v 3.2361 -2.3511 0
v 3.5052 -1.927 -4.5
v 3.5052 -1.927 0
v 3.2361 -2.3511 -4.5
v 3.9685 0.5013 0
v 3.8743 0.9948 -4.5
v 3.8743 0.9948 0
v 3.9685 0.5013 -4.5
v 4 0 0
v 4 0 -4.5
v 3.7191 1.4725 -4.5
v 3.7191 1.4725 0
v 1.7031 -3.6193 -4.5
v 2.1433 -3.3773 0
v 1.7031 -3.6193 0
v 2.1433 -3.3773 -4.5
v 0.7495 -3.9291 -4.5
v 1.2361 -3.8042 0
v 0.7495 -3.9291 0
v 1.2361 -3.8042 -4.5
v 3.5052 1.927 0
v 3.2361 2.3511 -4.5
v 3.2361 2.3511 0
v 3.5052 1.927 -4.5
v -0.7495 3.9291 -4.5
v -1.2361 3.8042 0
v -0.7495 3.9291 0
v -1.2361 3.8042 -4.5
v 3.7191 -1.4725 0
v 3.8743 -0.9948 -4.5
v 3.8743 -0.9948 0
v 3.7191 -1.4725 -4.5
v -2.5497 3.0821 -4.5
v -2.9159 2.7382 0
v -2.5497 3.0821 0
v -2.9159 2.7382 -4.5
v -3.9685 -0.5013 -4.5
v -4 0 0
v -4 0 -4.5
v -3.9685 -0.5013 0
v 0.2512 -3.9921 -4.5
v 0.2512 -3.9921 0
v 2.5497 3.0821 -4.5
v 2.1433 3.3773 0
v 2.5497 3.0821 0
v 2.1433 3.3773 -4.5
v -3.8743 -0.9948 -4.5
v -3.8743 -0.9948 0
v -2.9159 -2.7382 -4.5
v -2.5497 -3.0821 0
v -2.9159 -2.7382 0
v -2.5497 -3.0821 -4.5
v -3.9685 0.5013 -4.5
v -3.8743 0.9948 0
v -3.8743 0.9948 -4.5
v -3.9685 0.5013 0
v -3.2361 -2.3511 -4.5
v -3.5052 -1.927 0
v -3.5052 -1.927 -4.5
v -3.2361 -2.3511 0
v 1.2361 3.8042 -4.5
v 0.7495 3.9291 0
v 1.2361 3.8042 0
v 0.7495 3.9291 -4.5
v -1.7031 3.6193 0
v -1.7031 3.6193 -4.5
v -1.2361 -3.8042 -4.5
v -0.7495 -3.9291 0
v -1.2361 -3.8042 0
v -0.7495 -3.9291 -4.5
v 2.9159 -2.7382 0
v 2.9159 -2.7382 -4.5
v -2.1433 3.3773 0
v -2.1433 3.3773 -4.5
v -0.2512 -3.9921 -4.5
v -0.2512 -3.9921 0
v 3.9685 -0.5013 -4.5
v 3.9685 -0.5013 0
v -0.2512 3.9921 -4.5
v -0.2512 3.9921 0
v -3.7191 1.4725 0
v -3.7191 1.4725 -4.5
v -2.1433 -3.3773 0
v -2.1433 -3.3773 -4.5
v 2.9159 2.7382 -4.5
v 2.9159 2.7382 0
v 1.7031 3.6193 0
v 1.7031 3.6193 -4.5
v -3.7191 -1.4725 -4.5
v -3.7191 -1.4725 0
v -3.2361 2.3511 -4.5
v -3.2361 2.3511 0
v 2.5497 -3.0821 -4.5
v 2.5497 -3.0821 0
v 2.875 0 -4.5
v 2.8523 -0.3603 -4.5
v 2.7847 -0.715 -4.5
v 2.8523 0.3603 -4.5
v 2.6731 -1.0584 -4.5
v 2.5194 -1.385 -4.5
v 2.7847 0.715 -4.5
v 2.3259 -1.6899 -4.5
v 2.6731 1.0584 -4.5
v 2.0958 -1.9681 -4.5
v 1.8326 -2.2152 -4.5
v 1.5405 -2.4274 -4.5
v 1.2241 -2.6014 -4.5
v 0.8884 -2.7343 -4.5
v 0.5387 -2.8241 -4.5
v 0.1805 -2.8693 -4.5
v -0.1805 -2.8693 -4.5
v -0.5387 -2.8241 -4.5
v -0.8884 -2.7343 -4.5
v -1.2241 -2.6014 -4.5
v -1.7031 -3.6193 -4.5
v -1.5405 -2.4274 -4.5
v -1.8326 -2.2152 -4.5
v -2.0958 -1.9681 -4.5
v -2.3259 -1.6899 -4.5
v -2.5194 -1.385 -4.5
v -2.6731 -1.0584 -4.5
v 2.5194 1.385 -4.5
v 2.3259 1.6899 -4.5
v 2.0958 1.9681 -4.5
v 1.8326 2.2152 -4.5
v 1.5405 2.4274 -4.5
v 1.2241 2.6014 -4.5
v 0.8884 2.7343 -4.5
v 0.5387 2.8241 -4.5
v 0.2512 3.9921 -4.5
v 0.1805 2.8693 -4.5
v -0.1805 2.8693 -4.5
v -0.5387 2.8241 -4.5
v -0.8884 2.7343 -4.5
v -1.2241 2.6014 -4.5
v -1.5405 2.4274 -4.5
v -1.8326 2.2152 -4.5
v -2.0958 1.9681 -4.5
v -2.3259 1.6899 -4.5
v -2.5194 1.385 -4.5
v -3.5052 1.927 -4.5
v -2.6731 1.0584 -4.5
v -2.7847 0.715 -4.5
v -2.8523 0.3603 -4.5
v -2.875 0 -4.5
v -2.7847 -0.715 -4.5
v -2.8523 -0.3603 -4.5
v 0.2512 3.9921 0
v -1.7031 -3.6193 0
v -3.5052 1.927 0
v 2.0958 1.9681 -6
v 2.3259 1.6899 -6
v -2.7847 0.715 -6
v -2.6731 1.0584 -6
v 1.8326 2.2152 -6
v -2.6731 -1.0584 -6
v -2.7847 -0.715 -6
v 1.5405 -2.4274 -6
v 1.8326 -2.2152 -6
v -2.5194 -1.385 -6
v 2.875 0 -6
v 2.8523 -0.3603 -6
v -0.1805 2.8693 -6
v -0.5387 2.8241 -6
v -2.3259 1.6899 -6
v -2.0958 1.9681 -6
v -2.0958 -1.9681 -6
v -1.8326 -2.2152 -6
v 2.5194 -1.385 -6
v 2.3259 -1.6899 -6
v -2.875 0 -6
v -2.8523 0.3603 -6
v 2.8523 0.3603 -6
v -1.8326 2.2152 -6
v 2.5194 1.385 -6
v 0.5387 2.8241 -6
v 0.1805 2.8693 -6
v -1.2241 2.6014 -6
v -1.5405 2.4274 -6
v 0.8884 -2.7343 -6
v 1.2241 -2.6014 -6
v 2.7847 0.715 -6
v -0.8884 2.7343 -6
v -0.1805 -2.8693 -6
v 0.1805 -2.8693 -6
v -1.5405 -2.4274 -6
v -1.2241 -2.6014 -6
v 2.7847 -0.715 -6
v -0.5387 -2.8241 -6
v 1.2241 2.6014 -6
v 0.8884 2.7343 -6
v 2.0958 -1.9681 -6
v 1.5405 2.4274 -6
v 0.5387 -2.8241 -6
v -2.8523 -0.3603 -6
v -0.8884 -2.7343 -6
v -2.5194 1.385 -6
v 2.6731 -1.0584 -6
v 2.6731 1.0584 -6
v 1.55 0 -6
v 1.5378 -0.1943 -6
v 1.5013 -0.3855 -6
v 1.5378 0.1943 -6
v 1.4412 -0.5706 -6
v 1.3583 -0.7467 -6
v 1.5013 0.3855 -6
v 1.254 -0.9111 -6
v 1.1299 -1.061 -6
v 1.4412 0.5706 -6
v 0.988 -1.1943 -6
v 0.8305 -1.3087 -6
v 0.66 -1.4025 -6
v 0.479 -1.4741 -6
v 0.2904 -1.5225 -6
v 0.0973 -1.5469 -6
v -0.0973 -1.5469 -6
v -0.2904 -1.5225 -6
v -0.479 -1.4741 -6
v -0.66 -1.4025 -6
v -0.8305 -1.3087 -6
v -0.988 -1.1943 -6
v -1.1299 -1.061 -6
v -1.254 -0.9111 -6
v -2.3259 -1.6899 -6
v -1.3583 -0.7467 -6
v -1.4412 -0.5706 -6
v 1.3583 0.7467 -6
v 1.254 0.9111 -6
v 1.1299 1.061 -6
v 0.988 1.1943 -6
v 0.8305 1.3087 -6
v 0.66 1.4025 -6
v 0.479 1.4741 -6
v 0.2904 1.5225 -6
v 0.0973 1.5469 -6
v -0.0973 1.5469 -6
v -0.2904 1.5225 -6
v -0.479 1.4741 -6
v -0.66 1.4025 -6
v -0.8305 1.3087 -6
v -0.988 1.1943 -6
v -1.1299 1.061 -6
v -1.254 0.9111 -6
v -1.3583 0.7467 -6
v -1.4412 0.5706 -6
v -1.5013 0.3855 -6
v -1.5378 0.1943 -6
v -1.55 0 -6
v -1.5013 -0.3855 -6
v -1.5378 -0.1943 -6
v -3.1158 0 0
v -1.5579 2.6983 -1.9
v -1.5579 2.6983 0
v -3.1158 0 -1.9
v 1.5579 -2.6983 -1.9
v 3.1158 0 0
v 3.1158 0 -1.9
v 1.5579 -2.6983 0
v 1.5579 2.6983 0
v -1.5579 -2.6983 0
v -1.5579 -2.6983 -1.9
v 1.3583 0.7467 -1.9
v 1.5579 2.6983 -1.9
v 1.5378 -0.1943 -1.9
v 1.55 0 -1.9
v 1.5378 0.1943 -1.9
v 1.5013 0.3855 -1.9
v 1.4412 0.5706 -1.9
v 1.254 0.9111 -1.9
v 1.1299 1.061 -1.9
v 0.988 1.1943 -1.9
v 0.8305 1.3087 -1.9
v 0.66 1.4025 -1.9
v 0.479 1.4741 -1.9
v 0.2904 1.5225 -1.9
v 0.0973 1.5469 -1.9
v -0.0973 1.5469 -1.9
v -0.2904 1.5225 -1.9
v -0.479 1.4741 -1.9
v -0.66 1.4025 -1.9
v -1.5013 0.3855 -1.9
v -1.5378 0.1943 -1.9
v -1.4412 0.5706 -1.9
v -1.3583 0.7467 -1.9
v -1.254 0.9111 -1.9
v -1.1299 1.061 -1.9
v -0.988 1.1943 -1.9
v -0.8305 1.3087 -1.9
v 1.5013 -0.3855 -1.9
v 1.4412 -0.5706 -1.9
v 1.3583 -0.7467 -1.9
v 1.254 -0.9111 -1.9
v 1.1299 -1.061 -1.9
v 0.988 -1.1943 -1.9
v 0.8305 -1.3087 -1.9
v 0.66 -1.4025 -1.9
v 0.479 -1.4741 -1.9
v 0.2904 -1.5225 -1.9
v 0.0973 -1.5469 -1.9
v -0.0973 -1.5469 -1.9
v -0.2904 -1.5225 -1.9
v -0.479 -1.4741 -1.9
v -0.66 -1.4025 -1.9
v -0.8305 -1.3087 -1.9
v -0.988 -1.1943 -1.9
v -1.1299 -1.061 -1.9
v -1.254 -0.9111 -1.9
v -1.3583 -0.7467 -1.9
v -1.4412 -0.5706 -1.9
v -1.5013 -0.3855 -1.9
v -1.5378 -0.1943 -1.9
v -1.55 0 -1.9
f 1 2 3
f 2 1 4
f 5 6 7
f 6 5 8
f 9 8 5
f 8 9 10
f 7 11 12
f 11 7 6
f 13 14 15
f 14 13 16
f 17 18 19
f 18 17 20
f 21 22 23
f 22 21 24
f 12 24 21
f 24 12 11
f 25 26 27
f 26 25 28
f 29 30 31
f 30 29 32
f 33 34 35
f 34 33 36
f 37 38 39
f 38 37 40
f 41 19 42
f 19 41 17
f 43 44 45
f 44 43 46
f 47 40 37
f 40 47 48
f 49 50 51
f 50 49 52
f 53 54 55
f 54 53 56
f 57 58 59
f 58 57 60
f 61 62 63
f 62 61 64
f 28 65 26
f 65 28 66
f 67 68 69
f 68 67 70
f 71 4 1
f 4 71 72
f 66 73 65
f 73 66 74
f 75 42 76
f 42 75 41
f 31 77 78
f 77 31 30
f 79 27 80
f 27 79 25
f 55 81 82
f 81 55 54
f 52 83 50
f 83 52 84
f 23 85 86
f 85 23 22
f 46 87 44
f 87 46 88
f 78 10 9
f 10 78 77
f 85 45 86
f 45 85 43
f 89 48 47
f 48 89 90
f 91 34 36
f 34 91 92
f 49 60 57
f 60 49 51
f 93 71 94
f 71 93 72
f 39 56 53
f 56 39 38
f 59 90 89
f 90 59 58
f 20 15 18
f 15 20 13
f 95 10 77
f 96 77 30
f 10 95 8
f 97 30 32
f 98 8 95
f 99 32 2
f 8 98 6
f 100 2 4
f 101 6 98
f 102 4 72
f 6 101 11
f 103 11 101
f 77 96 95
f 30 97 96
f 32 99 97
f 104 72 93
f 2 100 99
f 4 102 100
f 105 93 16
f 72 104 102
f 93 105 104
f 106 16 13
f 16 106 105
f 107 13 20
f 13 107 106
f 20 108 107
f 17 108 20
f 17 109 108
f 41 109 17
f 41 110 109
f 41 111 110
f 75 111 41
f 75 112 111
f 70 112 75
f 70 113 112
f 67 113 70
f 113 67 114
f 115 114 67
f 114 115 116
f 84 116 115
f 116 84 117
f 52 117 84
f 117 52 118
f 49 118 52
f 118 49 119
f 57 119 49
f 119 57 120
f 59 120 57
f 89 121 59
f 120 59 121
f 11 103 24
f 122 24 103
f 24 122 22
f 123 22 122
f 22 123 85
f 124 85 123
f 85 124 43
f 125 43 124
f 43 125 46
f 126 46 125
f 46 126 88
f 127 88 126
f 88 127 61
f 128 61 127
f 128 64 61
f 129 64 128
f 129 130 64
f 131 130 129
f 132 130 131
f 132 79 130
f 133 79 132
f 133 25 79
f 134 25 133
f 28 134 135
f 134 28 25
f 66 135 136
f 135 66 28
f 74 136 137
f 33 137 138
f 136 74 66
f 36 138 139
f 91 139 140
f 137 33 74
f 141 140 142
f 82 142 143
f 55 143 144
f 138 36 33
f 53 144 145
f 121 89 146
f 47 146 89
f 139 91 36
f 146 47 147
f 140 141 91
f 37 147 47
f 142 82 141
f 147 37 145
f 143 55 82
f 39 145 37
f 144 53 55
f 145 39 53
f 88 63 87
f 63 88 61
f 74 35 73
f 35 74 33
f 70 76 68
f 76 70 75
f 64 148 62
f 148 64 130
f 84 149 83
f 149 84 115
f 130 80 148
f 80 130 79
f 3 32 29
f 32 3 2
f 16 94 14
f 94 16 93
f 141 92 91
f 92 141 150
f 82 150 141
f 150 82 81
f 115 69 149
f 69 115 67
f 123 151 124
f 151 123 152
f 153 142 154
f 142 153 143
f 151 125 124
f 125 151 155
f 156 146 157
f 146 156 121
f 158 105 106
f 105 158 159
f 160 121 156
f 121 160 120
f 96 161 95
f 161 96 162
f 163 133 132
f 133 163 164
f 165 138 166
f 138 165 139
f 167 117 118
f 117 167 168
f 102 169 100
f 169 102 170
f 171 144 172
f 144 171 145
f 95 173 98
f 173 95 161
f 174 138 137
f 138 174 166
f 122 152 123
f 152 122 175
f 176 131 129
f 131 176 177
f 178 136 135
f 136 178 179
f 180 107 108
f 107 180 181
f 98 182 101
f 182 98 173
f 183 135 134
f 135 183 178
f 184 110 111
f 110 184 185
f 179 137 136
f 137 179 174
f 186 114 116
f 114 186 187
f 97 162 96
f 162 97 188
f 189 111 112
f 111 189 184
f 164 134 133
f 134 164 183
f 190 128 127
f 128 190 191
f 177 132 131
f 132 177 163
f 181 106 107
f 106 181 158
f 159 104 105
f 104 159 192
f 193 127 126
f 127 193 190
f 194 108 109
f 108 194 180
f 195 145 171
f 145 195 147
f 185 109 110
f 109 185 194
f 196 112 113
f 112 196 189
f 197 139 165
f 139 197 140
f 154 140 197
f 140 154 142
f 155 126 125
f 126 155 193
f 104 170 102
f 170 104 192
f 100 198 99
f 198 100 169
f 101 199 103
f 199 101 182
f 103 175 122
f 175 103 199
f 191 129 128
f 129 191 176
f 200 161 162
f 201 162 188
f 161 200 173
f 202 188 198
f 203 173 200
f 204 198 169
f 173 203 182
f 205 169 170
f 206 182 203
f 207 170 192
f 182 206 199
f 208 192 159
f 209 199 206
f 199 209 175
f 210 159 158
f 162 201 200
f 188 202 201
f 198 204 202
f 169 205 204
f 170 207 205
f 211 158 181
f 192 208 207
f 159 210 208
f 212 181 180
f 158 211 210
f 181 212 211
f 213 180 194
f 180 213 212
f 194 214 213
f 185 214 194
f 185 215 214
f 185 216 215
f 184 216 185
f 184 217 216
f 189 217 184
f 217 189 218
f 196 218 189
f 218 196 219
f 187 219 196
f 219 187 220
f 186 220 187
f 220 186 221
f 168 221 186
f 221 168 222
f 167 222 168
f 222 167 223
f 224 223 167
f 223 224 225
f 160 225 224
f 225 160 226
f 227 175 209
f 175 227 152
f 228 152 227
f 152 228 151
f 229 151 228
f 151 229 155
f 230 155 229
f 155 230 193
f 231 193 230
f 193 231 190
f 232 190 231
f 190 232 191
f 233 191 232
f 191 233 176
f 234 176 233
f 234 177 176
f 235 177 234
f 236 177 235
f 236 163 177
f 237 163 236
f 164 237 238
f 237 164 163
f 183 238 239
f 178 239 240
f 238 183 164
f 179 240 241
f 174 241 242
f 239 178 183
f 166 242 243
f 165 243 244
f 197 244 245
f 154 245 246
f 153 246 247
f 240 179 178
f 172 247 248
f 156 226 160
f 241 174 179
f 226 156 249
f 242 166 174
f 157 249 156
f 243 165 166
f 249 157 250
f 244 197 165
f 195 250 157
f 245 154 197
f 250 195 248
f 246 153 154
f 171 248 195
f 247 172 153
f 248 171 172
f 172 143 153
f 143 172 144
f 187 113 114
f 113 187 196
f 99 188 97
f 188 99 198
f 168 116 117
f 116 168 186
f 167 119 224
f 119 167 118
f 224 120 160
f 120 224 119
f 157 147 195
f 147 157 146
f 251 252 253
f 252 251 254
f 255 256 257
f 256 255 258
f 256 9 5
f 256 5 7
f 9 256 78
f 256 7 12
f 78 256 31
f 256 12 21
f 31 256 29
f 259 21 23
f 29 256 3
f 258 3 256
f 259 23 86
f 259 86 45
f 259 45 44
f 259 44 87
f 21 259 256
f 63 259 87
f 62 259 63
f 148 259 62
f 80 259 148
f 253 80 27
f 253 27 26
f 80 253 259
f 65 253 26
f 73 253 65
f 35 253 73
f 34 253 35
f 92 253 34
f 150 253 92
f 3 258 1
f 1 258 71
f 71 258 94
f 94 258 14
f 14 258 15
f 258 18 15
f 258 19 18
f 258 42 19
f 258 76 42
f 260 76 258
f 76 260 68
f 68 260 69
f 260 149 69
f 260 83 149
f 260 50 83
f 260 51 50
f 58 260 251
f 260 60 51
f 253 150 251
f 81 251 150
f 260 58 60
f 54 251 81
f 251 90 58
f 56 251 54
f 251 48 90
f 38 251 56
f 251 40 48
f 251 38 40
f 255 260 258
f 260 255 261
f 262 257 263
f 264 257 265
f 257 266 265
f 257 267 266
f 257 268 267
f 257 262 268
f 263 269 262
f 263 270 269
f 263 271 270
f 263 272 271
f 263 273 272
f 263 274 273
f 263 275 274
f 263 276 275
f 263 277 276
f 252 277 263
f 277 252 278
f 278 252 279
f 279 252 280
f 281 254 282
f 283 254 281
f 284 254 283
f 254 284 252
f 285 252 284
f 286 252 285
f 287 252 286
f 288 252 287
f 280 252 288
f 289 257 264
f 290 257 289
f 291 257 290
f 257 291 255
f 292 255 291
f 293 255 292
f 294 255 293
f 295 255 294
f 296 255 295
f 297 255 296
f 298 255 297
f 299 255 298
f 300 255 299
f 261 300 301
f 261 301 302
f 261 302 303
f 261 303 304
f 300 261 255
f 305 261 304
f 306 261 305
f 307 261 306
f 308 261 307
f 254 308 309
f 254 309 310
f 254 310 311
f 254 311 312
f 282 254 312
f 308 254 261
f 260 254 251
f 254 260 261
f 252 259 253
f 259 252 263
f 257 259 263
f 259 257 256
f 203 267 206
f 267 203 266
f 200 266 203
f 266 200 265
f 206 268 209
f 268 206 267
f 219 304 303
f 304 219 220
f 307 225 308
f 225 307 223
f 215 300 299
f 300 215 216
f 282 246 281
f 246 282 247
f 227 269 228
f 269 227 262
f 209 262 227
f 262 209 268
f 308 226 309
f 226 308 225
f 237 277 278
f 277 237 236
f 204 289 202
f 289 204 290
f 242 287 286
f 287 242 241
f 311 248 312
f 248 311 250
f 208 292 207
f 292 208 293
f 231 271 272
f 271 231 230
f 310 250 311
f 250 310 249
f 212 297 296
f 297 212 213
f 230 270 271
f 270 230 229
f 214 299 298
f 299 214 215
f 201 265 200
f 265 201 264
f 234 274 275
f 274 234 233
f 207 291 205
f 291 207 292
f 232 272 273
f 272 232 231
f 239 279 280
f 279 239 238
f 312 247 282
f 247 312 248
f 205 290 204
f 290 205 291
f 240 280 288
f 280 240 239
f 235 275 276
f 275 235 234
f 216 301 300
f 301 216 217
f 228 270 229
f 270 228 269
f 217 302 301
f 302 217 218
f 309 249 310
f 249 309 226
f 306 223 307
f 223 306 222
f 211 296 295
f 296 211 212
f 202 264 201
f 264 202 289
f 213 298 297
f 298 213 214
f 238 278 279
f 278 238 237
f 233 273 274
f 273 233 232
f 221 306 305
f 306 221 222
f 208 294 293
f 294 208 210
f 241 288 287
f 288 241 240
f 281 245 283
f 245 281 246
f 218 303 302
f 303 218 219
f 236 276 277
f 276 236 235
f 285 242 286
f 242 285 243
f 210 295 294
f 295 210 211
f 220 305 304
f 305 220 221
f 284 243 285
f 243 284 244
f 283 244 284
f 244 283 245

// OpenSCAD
$fn = 50;

difference() {
	union() {
		translate(v = [0, 0, -4.5]) {
			cylinder(h = 7.5, r = 4.0);
		}
		#translate(v = [0, 0, -6.0]) {
			cylinder(h = 6, r = 2.875);
		}
	}
	union() {
		translate(v = [0, 0, 0]) {
			rotate(a = [0, 0, 0]) {
				difference() {
					union() {
						translate(v = [0, 0, -1.9]) {
							linear_extrude(height = 1.9) {
								polygon(points = [[3.1158, 0.0], [1.5579000000000005, 2.698361953111554], [-1.5578999999999994, 2.6983619531115544], [-3.1158, 3.815754496783323e-16], [-1.5579000000000014, -2.6983619531115535], [1.557899999999998, -2.6983619531115552]]);
							}
						}
					}
					union();
				}
			}
		}
		#cylinder(h = 3, r = 5.0);
		#translate(v = [0, 0, -100.0]) {
			cylinder(h = 200, r = 1.55);
		}
	}
}
